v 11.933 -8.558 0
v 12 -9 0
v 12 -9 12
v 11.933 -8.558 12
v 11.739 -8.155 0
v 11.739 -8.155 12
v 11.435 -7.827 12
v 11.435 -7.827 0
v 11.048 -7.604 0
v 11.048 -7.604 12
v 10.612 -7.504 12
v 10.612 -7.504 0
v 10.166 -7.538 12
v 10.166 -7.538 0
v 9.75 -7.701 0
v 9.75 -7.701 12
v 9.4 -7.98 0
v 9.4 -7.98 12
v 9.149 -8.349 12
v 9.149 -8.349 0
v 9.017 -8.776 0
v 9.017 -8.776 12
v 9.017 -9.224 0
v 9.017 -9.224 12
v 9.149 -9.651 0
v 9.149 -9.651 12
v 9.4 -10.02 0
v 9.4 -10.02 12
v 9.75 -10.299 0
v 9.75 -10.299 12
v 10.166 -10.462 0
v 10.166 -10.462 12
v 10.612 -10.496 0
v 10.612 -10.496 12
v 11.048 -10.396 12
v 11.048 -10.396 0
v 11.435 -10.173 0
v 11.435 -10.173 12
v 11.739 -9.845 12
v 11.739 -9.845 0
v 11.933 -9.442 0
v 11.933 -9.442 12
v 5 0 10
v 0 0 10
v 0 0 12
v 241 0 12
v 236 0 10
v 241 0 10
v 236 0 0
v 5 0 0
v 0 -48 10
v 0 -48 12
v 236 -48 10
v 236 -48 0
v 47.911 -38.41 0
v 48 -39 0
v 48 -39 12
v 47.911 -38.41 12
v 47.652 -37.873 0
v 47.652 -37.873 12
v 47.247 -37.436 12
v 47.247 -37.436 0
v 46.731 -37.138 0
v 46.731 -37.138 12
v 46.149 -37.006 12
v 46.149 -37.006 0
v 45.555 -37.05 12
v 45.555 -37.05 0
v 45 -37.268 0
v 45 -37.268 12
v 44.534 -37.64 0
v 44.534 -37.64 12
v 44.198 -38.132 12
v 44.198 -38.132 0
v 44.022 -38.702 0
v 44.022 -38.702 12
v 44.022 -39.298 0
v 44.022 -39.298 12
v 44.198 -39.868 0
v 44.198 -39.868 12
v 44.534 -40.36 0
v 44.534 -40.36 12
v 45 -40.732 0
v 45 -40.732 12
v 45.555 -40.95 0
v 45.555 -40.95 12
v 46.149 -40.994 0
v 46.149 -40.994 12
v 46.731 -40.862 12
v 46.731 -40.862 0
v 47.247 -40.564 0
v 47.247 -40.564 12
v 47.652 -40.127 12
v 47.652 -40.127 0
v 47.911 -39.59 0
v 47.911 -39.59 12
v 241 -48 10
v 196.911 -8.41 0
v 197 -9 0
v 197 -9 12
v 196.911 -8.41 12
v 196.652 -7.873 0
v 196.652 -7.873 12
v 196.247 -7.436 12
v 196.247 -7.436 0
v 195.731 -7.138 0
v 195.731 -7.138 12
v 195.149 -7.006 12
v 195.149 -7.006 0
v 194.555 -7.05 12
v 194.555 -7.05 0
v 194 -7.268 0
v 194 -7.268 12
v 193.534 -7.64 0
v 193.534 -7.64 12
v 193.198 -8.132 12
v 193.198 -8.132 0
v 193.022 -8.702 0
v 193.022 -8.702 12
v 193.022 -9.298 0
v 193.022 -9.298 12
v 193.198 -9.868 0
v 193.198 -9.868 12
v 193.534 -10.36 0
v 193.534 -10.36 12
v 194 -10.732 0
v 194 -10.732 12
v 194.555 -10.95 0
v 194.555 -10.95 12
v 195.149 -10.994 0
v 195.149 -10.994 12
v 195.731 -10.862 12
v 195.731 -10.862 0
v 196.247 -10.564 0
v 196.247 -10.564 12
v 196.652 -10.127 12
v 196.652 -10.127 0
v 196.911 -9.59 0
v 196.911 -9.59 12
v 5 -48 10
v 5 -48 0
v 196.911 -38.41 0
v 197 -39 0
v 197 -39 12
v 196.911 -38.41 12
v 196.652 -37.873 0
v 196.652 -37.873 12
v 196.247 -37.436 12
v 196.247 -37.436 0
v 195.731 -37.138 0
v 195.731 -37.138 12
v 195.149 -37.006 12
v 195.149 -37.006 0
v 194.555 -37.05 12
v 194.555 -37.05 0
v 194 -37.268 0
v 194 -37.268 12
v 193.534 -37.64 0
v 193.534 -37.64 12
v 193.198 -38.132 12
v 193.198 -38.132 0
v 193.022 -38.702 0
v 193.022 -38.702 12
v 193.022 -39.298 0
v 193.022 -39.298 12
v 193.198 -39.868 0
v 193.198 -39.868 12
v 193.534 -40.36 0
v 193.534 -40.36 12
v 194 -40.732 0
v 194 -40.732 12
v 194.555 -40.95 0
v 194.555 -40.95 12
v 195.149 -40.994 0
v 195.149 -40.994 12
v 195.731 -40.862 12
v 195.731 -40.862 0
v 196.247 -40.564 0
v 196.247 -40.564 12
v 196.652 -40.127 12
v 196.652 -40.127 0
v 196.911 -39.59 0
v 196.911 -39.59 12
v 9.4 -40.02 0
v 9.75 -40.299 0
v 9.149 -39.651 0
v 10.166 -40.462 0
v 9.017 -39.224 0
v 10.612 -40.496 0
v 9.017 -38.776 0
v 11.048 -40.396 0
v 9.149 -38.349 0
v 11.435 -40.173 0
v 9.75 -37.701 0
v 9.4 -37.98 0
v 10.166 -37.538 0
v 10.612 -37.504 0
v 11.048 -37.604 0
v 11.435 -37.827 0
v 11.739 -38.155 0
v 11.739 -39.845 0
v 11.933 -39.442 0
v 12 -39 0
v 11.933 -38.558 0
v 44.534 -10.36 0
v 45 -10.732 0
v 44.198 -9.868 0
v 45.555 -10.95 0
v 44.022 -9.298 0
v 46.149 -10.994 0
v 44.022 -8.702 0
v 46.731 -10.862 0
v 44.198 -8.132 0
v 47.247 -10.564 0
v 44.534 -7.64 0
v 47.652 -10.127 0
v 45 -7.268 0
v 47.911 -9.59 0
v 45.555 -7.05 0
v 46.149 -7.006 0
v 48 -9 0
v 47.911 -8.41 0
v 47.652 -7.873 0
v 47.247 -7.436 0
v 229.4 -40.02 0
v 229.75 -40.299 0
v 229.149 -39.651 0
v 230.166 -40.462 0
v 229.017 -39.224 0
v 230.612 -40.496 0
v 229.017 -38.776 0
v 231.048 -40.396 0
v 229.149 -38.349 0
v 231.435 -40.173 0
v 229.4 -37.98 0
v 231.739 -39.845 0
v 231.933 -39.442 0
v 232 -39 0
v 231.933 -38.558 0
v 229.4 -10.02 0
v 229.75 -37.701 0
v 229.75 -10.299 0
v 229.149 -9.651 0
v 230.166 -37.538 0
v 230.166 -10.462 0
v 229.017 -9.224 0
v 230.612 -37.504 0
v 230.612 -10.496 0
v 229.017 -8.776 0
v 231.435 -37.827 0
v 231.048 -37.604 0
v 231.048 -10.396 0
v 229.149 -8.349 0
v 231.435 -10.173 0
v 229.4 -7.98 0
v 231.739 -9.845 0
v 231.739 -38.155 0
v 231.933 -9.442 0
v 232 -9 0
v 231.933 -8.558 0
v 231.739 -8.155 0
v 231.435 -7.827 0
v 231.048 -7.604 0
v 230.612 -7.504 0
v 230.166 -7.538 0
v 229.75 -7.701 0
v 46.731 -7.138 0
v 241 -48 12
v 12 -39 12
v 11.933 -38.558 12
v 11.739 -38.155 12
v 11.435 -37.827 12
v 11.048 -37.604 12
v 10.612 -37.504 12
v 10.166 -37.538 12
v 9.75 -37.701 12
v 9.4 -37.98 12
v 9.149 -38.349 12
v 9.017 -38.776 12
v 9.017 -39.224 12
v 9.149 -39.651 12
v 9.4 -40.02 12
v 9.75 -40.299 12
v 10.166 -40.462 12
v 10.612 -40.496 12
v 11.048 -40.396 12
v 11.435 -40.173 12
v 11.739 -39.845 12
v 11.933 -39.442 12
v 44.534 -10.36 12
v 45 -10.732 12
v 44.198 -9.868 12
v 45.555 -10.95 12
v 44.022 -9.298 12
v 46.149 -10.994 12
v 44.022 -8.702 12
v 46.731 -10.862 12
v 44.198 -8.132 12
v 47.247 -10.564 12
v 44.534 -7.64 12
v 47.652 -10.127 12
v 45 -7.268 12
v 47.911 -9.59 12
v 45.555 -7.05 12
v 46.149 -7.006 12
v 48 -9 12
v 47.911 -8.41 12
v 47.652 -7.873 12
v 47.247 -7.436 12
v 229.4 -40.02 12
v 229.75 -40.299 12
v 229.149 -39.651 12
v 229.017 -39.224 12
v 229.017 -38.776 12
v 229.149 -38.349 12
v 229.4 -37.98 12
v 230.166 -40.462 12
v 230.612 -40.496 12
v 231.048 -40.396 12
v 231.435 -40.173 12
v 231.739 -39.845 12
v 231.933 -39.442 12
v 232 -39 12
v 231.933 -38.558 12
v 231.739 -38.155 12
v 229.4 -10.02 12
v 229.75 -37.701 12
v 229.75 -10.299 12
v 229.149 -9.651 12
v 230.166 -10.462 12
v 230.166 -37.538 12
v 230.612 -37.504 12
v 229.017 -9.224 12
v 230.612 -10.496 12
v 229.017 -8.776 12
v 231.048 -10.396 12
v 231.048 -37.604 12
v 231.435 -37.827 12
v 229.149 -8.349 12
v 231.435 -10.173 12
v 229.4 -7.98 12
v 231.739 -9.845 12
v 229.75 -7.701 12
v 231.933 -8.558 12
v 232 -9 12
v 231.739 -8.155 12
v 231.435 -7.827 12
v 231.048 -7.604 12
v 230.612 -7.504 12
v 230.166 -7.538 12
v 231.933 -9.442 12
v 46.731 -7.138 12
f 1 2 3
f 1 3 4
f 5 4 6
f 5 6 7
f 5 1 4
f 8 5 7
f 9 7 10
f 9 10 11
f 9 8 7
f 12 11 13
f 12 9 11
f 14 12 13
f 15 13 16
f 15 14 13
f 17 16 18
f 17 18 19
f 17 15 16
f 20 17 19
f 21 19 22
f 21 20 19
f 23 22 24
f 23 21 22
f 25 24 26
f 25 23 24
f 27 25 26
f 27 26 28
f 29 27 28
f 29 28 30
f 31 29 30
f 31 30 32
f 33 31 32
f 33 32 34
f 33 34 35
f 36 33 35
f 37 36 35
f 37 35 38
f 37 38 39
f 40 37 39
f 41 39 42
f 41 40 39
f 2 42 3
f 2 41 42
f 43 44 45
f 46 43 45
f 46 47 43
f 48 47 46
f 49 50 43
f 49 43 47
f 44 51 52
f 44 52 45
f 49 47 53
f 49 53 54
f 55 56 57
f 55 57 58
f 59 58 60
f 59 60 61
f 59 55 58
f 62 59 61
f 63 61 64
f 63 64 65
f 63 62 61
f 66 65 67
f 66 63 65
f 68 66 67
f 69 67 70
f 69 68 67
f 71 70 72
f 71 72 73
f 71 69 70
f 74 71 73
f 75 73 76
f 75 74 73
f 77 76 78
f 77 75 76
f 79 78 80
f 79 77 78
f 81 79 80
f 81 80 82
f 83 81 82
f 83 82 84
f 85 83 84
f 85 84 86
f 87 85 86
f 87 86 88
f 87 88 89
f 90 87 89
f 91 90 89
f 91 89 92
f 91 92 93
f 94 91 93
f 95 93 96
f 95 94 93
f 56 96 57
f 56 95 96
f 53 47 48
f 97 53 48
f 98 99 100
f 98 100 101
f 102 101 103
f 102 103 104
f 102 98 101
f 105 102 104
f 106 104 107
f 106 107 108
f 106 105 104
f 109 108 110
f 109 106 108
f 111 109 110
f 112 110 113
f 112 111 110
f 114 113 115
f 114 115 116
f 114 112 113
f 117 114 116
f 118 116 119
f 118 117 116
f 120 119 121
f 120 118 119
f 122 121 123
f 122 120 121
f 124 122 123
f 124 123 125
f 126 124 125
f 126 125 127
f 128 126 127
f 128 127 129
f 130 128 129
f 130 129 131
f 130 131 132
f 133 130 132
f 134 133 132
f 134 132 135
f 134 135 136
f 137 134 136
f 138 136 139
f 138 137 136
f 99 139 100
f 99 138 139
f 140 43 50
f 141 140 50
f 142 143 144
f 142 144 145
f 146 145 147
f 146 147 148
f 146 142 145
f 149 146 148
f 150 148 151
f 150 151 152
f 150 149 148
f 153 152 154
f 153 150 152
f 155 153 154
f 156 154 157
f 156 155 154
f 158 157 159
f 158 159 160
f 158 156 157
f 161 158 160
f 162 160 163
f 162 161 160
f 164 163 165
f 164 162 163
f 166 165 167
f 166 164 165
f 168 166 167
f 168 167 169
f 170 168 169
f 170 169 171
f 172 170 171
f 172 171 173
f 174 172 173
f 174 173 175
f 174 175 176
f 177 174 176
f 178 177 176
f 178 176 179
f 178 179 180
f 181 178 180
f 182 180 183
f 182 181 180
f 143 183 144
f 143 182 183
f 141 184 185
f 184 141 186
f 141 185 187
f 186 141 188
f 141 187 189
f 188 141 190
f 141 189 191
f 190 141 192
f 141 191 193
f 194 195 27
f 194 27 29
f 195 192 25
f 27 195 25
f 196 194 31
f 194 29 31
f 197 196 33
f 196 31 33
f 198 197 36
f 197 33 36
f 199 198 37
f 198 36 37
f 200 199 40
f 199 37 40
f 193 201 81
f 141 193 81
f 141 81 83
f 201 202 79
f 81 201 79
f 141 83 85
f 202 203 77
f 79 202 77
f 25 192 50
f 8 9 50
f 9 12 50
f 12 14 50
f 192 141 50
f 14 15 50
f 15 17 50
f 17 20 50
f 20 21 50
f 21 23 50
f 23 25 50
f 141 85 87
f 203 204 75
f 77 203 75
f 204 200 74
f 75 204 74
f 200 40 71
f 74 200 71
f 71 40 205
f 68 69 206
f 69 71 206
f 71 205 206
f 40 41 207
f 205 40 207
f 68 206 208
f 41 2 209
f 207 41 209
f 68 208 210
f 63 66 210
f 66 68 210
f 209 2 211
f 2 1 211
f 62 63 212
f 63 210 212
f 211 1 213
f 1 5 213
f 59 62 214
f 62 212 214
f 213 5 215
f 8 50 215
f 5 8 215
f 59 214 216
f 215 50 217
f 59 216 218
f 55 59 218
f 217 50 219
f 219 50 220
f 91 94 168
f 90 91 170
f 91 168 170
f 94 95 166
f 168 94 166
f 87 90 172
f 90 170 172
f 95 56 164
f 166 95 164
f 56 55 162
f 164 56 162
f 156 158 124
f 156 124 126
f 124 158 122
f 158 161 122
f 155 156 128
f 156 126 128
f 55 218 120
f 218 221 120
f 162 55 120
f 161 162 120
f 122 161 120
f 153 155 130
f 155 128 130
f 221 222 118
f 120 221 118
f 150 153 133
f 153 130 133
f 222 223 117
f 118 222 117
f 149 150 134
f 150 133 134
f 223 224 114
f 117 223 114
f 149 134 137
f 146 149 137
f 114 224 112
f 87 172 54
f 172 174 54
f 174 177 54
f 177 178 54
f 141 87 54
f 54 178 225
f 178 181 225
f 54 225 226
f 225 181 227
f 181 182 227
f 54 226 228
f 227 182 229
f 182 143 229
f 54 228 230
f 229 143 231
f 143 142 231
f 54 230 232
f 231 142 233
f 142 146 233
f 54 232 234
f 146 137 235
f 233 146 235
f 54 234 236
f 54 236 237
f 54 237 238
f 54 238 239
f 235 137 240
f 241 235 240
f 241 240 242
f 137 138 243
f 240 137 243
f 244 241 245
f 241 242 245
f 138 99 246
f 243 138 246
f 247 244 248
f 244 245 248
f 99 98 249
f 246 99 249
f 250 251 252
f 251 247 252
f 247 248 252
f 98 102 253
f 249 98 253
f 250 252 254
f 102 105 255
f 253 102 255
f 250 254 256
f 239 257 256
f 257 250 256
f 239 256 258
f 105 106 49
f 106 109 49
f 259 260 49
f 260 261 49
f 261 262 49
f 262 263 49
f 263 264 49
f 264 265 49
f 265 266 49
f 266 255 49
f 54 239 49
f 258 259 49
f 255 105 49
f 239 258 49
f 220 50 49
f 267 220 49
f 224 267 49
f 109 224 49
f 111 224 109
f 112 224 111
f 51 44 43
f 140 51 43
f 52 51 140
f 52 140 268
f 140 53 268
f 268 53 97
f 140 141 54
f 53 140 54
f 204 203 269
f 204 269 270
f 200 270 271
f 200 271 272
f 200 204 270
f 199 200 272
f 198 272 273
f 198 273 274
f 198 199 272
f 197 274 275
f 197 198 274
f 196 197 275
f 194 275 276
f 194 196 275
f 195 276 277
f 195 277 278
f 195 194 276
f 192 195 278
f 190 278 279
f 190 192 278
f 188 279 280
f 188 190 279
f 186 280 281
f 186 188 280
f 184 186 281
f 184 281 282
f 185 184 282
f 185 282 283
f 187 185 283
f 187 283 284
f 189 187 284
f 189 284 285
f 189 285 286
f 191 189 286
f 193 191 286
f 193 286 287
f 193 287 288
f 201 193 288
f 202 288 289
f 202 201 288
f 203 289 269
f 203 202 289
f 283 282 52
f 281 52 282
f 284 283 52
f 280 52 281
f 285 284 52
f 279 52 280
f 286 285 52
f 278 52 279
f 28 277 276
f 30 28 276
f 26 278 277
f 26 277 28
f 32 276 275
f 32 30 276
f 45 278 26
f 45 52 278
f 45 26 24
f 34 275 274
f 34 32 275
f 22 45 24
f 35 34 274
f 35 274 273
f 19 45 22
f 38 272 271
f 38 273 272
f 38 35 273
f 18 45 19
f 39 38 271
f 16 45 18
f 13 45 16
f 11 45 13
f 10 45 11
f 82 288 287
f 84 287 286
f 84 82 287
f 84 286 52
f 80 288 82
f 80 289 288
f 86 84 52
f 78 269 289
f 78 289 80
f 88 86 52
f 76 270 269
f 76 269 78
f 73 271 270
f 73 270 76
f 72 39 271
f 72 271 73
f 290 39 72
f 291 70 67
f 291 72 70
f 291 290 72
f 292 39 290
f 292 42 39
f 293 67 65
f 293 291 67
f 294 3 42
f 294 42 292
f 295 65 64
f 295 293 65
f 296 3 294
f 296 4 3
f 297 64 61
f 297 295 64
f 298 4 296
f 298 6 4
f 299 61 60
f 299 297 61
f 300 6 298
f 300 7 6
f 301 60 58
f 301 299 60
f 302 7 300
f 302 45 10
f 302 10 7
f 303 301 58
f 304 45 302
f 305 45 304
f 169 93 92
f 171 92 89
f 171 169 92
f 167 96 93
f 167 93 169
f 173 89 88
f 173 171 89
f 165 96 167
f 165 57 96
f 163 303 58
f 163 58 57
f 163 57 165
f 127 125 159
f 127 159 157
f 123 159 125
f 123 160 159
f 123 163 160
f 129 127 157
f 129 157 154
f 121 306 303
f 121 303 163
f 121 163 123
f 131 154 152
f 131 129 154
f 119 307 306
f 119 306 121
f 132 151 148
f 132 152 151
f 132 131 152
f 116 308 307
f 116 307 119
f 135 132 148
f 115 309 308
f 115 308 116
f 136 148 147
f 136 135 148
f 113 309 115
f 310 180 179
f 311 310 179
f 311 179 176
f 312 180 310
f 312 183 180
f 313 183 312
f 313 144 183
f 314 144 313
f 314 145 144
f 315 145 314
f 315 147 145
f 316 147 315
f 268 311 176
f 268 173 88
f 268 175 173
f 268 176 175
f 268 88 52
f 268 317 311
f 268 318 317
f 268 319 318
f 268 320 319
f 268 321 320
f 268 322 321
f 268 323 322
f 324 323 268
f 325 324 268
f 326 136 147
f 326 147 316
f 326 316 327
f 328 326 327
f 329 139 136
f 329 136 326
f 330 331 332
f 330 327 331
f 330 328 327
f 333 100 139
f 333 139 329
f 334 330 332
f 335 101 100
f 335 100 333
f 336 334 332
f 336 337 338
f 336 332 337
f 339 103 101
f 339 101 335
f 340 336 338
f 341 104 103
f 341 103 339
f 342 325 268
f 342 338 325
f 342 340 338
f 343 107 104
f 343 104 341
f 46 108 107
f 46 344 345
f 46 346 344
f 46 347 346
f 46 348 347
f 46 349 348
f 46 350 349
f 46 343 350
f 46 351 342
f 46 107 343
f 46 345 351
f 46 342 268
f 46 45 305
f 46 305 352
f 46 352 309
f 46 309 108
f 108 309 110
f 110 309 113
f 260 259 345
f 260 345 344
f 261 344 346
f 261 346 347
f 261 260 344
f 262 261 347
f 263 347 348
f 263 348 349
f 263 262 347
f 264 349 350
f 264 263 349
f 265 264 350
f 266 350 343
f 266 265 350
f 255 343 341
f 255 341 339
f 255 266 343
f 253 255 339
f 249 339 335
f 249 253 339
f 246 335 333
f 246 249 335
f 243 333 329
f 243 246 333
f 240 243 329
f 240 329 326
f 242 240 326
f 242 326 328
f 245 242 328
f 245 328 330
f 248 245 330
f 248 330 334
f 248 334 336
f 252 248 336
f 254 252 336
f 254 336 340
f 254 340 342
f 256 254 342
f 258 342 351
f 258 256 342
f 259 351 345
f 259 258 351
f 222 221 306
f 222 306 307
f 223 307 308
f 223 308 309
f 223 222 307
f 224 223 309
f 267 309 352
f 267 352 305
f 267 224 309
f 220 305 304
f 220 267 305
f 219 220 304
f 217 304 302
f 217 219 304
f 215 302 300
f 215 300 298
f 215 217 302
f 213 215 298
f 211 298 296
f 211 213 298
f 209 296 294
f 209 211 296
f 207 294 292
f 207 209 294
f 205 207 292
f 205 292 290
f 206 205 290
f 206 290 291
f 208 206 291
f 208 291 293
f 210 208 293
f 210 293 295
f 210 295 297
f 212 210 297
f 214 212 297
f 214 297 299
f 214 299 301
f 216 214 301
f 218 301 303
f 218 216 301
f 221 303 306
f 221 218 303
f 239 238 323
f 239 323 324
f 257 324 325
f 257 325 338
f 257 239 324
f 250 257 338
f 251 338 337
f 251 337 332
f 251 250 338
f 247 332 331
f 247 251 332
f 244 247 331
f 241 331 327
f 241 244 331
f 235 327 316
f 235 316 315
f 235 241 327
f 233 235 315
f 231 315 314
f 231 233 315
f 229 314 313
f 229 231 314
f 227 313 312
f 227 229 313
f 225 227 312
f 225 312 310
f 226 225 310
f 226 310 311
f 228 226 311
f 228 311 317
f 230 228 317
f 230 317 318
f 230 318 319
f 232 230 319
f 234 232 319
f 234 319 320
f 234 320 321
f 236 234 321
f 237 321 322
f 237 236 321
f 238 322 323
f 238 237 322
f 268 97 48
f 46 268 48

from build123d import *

# Parameters (mm, degrees)
ESQUISSE1_W      = 241
ESQUISSE1_H      = 48
ESQUISSE1_R      = 1.5
ESQUISSE1_R_2    = 2
EXTRUSION1_DEPTH = 12
ESQUISSE2_W      = 5
ESQUISSE2_H      = 10
EXTRUSION2_DEPTH = 49


with BuildPart() as part:
    # Esquisse1 → Extrusion1 (new body)
    with BuildSketch(Plane.XY):
        with Locations((120.5, -24)):
            Rectangle(ESQUISSE1_W, ESQUISSE1_H)
        with Locations((230.5, -39)):
            Circle(ESQUISSE1_R, mode=Mode.SUBTRACT)
        with Locations((10.5, -9)):
            Circle(ESQUISSE1_R, mode=Mode.SUBTRACT)
        with Locations((10.5, -39)):
            Circle(ESQUISSE1_R, mode=Mode.SUBTRACT)
        with Locations((230.5, -9)):
            Circle(ESQUISSE1_R, mode=Mode.SUBTRACT)
        with Locations((195, -39)):
            Circle(ESQUISSE1_R_2, mode=Mode.SUBTRACT)
        with Locations((46, -9)):
            Circle(ESQUISSE1_R_2, mode=Mode.SUBTRACT)
        with Locations((46, -39)):
            Circle(ESQUISSE1_R_2, mode=Mode.SUBTRACT)
        with Locations((195, -9)):
            Circle(ESQUISSE1_R_2, mode=Mode.SUBTRACT)
    extrude(amount=EXTRUSION1_DEPTH)

    # Esquisse2 → Extrusion2 (cut, through all)
    with BuildSketch(Plane(origin=(0, 0, 0), x_dir=(1, 0, 0), z_dir=(0, 1, 0))):
        with Locations((2.5, -5)):
            Rectangle(ESQUISSE2_W, ESQUISSE2_H)
        with Locations((238.5, -5)):
            Rectangle(ESQUISSE2_W, ESQUISSE2_H)
    extrude(amount=-EXTRUSION2_DEPTH, mode=Mode.SUBTRACT)


solid = part.part
